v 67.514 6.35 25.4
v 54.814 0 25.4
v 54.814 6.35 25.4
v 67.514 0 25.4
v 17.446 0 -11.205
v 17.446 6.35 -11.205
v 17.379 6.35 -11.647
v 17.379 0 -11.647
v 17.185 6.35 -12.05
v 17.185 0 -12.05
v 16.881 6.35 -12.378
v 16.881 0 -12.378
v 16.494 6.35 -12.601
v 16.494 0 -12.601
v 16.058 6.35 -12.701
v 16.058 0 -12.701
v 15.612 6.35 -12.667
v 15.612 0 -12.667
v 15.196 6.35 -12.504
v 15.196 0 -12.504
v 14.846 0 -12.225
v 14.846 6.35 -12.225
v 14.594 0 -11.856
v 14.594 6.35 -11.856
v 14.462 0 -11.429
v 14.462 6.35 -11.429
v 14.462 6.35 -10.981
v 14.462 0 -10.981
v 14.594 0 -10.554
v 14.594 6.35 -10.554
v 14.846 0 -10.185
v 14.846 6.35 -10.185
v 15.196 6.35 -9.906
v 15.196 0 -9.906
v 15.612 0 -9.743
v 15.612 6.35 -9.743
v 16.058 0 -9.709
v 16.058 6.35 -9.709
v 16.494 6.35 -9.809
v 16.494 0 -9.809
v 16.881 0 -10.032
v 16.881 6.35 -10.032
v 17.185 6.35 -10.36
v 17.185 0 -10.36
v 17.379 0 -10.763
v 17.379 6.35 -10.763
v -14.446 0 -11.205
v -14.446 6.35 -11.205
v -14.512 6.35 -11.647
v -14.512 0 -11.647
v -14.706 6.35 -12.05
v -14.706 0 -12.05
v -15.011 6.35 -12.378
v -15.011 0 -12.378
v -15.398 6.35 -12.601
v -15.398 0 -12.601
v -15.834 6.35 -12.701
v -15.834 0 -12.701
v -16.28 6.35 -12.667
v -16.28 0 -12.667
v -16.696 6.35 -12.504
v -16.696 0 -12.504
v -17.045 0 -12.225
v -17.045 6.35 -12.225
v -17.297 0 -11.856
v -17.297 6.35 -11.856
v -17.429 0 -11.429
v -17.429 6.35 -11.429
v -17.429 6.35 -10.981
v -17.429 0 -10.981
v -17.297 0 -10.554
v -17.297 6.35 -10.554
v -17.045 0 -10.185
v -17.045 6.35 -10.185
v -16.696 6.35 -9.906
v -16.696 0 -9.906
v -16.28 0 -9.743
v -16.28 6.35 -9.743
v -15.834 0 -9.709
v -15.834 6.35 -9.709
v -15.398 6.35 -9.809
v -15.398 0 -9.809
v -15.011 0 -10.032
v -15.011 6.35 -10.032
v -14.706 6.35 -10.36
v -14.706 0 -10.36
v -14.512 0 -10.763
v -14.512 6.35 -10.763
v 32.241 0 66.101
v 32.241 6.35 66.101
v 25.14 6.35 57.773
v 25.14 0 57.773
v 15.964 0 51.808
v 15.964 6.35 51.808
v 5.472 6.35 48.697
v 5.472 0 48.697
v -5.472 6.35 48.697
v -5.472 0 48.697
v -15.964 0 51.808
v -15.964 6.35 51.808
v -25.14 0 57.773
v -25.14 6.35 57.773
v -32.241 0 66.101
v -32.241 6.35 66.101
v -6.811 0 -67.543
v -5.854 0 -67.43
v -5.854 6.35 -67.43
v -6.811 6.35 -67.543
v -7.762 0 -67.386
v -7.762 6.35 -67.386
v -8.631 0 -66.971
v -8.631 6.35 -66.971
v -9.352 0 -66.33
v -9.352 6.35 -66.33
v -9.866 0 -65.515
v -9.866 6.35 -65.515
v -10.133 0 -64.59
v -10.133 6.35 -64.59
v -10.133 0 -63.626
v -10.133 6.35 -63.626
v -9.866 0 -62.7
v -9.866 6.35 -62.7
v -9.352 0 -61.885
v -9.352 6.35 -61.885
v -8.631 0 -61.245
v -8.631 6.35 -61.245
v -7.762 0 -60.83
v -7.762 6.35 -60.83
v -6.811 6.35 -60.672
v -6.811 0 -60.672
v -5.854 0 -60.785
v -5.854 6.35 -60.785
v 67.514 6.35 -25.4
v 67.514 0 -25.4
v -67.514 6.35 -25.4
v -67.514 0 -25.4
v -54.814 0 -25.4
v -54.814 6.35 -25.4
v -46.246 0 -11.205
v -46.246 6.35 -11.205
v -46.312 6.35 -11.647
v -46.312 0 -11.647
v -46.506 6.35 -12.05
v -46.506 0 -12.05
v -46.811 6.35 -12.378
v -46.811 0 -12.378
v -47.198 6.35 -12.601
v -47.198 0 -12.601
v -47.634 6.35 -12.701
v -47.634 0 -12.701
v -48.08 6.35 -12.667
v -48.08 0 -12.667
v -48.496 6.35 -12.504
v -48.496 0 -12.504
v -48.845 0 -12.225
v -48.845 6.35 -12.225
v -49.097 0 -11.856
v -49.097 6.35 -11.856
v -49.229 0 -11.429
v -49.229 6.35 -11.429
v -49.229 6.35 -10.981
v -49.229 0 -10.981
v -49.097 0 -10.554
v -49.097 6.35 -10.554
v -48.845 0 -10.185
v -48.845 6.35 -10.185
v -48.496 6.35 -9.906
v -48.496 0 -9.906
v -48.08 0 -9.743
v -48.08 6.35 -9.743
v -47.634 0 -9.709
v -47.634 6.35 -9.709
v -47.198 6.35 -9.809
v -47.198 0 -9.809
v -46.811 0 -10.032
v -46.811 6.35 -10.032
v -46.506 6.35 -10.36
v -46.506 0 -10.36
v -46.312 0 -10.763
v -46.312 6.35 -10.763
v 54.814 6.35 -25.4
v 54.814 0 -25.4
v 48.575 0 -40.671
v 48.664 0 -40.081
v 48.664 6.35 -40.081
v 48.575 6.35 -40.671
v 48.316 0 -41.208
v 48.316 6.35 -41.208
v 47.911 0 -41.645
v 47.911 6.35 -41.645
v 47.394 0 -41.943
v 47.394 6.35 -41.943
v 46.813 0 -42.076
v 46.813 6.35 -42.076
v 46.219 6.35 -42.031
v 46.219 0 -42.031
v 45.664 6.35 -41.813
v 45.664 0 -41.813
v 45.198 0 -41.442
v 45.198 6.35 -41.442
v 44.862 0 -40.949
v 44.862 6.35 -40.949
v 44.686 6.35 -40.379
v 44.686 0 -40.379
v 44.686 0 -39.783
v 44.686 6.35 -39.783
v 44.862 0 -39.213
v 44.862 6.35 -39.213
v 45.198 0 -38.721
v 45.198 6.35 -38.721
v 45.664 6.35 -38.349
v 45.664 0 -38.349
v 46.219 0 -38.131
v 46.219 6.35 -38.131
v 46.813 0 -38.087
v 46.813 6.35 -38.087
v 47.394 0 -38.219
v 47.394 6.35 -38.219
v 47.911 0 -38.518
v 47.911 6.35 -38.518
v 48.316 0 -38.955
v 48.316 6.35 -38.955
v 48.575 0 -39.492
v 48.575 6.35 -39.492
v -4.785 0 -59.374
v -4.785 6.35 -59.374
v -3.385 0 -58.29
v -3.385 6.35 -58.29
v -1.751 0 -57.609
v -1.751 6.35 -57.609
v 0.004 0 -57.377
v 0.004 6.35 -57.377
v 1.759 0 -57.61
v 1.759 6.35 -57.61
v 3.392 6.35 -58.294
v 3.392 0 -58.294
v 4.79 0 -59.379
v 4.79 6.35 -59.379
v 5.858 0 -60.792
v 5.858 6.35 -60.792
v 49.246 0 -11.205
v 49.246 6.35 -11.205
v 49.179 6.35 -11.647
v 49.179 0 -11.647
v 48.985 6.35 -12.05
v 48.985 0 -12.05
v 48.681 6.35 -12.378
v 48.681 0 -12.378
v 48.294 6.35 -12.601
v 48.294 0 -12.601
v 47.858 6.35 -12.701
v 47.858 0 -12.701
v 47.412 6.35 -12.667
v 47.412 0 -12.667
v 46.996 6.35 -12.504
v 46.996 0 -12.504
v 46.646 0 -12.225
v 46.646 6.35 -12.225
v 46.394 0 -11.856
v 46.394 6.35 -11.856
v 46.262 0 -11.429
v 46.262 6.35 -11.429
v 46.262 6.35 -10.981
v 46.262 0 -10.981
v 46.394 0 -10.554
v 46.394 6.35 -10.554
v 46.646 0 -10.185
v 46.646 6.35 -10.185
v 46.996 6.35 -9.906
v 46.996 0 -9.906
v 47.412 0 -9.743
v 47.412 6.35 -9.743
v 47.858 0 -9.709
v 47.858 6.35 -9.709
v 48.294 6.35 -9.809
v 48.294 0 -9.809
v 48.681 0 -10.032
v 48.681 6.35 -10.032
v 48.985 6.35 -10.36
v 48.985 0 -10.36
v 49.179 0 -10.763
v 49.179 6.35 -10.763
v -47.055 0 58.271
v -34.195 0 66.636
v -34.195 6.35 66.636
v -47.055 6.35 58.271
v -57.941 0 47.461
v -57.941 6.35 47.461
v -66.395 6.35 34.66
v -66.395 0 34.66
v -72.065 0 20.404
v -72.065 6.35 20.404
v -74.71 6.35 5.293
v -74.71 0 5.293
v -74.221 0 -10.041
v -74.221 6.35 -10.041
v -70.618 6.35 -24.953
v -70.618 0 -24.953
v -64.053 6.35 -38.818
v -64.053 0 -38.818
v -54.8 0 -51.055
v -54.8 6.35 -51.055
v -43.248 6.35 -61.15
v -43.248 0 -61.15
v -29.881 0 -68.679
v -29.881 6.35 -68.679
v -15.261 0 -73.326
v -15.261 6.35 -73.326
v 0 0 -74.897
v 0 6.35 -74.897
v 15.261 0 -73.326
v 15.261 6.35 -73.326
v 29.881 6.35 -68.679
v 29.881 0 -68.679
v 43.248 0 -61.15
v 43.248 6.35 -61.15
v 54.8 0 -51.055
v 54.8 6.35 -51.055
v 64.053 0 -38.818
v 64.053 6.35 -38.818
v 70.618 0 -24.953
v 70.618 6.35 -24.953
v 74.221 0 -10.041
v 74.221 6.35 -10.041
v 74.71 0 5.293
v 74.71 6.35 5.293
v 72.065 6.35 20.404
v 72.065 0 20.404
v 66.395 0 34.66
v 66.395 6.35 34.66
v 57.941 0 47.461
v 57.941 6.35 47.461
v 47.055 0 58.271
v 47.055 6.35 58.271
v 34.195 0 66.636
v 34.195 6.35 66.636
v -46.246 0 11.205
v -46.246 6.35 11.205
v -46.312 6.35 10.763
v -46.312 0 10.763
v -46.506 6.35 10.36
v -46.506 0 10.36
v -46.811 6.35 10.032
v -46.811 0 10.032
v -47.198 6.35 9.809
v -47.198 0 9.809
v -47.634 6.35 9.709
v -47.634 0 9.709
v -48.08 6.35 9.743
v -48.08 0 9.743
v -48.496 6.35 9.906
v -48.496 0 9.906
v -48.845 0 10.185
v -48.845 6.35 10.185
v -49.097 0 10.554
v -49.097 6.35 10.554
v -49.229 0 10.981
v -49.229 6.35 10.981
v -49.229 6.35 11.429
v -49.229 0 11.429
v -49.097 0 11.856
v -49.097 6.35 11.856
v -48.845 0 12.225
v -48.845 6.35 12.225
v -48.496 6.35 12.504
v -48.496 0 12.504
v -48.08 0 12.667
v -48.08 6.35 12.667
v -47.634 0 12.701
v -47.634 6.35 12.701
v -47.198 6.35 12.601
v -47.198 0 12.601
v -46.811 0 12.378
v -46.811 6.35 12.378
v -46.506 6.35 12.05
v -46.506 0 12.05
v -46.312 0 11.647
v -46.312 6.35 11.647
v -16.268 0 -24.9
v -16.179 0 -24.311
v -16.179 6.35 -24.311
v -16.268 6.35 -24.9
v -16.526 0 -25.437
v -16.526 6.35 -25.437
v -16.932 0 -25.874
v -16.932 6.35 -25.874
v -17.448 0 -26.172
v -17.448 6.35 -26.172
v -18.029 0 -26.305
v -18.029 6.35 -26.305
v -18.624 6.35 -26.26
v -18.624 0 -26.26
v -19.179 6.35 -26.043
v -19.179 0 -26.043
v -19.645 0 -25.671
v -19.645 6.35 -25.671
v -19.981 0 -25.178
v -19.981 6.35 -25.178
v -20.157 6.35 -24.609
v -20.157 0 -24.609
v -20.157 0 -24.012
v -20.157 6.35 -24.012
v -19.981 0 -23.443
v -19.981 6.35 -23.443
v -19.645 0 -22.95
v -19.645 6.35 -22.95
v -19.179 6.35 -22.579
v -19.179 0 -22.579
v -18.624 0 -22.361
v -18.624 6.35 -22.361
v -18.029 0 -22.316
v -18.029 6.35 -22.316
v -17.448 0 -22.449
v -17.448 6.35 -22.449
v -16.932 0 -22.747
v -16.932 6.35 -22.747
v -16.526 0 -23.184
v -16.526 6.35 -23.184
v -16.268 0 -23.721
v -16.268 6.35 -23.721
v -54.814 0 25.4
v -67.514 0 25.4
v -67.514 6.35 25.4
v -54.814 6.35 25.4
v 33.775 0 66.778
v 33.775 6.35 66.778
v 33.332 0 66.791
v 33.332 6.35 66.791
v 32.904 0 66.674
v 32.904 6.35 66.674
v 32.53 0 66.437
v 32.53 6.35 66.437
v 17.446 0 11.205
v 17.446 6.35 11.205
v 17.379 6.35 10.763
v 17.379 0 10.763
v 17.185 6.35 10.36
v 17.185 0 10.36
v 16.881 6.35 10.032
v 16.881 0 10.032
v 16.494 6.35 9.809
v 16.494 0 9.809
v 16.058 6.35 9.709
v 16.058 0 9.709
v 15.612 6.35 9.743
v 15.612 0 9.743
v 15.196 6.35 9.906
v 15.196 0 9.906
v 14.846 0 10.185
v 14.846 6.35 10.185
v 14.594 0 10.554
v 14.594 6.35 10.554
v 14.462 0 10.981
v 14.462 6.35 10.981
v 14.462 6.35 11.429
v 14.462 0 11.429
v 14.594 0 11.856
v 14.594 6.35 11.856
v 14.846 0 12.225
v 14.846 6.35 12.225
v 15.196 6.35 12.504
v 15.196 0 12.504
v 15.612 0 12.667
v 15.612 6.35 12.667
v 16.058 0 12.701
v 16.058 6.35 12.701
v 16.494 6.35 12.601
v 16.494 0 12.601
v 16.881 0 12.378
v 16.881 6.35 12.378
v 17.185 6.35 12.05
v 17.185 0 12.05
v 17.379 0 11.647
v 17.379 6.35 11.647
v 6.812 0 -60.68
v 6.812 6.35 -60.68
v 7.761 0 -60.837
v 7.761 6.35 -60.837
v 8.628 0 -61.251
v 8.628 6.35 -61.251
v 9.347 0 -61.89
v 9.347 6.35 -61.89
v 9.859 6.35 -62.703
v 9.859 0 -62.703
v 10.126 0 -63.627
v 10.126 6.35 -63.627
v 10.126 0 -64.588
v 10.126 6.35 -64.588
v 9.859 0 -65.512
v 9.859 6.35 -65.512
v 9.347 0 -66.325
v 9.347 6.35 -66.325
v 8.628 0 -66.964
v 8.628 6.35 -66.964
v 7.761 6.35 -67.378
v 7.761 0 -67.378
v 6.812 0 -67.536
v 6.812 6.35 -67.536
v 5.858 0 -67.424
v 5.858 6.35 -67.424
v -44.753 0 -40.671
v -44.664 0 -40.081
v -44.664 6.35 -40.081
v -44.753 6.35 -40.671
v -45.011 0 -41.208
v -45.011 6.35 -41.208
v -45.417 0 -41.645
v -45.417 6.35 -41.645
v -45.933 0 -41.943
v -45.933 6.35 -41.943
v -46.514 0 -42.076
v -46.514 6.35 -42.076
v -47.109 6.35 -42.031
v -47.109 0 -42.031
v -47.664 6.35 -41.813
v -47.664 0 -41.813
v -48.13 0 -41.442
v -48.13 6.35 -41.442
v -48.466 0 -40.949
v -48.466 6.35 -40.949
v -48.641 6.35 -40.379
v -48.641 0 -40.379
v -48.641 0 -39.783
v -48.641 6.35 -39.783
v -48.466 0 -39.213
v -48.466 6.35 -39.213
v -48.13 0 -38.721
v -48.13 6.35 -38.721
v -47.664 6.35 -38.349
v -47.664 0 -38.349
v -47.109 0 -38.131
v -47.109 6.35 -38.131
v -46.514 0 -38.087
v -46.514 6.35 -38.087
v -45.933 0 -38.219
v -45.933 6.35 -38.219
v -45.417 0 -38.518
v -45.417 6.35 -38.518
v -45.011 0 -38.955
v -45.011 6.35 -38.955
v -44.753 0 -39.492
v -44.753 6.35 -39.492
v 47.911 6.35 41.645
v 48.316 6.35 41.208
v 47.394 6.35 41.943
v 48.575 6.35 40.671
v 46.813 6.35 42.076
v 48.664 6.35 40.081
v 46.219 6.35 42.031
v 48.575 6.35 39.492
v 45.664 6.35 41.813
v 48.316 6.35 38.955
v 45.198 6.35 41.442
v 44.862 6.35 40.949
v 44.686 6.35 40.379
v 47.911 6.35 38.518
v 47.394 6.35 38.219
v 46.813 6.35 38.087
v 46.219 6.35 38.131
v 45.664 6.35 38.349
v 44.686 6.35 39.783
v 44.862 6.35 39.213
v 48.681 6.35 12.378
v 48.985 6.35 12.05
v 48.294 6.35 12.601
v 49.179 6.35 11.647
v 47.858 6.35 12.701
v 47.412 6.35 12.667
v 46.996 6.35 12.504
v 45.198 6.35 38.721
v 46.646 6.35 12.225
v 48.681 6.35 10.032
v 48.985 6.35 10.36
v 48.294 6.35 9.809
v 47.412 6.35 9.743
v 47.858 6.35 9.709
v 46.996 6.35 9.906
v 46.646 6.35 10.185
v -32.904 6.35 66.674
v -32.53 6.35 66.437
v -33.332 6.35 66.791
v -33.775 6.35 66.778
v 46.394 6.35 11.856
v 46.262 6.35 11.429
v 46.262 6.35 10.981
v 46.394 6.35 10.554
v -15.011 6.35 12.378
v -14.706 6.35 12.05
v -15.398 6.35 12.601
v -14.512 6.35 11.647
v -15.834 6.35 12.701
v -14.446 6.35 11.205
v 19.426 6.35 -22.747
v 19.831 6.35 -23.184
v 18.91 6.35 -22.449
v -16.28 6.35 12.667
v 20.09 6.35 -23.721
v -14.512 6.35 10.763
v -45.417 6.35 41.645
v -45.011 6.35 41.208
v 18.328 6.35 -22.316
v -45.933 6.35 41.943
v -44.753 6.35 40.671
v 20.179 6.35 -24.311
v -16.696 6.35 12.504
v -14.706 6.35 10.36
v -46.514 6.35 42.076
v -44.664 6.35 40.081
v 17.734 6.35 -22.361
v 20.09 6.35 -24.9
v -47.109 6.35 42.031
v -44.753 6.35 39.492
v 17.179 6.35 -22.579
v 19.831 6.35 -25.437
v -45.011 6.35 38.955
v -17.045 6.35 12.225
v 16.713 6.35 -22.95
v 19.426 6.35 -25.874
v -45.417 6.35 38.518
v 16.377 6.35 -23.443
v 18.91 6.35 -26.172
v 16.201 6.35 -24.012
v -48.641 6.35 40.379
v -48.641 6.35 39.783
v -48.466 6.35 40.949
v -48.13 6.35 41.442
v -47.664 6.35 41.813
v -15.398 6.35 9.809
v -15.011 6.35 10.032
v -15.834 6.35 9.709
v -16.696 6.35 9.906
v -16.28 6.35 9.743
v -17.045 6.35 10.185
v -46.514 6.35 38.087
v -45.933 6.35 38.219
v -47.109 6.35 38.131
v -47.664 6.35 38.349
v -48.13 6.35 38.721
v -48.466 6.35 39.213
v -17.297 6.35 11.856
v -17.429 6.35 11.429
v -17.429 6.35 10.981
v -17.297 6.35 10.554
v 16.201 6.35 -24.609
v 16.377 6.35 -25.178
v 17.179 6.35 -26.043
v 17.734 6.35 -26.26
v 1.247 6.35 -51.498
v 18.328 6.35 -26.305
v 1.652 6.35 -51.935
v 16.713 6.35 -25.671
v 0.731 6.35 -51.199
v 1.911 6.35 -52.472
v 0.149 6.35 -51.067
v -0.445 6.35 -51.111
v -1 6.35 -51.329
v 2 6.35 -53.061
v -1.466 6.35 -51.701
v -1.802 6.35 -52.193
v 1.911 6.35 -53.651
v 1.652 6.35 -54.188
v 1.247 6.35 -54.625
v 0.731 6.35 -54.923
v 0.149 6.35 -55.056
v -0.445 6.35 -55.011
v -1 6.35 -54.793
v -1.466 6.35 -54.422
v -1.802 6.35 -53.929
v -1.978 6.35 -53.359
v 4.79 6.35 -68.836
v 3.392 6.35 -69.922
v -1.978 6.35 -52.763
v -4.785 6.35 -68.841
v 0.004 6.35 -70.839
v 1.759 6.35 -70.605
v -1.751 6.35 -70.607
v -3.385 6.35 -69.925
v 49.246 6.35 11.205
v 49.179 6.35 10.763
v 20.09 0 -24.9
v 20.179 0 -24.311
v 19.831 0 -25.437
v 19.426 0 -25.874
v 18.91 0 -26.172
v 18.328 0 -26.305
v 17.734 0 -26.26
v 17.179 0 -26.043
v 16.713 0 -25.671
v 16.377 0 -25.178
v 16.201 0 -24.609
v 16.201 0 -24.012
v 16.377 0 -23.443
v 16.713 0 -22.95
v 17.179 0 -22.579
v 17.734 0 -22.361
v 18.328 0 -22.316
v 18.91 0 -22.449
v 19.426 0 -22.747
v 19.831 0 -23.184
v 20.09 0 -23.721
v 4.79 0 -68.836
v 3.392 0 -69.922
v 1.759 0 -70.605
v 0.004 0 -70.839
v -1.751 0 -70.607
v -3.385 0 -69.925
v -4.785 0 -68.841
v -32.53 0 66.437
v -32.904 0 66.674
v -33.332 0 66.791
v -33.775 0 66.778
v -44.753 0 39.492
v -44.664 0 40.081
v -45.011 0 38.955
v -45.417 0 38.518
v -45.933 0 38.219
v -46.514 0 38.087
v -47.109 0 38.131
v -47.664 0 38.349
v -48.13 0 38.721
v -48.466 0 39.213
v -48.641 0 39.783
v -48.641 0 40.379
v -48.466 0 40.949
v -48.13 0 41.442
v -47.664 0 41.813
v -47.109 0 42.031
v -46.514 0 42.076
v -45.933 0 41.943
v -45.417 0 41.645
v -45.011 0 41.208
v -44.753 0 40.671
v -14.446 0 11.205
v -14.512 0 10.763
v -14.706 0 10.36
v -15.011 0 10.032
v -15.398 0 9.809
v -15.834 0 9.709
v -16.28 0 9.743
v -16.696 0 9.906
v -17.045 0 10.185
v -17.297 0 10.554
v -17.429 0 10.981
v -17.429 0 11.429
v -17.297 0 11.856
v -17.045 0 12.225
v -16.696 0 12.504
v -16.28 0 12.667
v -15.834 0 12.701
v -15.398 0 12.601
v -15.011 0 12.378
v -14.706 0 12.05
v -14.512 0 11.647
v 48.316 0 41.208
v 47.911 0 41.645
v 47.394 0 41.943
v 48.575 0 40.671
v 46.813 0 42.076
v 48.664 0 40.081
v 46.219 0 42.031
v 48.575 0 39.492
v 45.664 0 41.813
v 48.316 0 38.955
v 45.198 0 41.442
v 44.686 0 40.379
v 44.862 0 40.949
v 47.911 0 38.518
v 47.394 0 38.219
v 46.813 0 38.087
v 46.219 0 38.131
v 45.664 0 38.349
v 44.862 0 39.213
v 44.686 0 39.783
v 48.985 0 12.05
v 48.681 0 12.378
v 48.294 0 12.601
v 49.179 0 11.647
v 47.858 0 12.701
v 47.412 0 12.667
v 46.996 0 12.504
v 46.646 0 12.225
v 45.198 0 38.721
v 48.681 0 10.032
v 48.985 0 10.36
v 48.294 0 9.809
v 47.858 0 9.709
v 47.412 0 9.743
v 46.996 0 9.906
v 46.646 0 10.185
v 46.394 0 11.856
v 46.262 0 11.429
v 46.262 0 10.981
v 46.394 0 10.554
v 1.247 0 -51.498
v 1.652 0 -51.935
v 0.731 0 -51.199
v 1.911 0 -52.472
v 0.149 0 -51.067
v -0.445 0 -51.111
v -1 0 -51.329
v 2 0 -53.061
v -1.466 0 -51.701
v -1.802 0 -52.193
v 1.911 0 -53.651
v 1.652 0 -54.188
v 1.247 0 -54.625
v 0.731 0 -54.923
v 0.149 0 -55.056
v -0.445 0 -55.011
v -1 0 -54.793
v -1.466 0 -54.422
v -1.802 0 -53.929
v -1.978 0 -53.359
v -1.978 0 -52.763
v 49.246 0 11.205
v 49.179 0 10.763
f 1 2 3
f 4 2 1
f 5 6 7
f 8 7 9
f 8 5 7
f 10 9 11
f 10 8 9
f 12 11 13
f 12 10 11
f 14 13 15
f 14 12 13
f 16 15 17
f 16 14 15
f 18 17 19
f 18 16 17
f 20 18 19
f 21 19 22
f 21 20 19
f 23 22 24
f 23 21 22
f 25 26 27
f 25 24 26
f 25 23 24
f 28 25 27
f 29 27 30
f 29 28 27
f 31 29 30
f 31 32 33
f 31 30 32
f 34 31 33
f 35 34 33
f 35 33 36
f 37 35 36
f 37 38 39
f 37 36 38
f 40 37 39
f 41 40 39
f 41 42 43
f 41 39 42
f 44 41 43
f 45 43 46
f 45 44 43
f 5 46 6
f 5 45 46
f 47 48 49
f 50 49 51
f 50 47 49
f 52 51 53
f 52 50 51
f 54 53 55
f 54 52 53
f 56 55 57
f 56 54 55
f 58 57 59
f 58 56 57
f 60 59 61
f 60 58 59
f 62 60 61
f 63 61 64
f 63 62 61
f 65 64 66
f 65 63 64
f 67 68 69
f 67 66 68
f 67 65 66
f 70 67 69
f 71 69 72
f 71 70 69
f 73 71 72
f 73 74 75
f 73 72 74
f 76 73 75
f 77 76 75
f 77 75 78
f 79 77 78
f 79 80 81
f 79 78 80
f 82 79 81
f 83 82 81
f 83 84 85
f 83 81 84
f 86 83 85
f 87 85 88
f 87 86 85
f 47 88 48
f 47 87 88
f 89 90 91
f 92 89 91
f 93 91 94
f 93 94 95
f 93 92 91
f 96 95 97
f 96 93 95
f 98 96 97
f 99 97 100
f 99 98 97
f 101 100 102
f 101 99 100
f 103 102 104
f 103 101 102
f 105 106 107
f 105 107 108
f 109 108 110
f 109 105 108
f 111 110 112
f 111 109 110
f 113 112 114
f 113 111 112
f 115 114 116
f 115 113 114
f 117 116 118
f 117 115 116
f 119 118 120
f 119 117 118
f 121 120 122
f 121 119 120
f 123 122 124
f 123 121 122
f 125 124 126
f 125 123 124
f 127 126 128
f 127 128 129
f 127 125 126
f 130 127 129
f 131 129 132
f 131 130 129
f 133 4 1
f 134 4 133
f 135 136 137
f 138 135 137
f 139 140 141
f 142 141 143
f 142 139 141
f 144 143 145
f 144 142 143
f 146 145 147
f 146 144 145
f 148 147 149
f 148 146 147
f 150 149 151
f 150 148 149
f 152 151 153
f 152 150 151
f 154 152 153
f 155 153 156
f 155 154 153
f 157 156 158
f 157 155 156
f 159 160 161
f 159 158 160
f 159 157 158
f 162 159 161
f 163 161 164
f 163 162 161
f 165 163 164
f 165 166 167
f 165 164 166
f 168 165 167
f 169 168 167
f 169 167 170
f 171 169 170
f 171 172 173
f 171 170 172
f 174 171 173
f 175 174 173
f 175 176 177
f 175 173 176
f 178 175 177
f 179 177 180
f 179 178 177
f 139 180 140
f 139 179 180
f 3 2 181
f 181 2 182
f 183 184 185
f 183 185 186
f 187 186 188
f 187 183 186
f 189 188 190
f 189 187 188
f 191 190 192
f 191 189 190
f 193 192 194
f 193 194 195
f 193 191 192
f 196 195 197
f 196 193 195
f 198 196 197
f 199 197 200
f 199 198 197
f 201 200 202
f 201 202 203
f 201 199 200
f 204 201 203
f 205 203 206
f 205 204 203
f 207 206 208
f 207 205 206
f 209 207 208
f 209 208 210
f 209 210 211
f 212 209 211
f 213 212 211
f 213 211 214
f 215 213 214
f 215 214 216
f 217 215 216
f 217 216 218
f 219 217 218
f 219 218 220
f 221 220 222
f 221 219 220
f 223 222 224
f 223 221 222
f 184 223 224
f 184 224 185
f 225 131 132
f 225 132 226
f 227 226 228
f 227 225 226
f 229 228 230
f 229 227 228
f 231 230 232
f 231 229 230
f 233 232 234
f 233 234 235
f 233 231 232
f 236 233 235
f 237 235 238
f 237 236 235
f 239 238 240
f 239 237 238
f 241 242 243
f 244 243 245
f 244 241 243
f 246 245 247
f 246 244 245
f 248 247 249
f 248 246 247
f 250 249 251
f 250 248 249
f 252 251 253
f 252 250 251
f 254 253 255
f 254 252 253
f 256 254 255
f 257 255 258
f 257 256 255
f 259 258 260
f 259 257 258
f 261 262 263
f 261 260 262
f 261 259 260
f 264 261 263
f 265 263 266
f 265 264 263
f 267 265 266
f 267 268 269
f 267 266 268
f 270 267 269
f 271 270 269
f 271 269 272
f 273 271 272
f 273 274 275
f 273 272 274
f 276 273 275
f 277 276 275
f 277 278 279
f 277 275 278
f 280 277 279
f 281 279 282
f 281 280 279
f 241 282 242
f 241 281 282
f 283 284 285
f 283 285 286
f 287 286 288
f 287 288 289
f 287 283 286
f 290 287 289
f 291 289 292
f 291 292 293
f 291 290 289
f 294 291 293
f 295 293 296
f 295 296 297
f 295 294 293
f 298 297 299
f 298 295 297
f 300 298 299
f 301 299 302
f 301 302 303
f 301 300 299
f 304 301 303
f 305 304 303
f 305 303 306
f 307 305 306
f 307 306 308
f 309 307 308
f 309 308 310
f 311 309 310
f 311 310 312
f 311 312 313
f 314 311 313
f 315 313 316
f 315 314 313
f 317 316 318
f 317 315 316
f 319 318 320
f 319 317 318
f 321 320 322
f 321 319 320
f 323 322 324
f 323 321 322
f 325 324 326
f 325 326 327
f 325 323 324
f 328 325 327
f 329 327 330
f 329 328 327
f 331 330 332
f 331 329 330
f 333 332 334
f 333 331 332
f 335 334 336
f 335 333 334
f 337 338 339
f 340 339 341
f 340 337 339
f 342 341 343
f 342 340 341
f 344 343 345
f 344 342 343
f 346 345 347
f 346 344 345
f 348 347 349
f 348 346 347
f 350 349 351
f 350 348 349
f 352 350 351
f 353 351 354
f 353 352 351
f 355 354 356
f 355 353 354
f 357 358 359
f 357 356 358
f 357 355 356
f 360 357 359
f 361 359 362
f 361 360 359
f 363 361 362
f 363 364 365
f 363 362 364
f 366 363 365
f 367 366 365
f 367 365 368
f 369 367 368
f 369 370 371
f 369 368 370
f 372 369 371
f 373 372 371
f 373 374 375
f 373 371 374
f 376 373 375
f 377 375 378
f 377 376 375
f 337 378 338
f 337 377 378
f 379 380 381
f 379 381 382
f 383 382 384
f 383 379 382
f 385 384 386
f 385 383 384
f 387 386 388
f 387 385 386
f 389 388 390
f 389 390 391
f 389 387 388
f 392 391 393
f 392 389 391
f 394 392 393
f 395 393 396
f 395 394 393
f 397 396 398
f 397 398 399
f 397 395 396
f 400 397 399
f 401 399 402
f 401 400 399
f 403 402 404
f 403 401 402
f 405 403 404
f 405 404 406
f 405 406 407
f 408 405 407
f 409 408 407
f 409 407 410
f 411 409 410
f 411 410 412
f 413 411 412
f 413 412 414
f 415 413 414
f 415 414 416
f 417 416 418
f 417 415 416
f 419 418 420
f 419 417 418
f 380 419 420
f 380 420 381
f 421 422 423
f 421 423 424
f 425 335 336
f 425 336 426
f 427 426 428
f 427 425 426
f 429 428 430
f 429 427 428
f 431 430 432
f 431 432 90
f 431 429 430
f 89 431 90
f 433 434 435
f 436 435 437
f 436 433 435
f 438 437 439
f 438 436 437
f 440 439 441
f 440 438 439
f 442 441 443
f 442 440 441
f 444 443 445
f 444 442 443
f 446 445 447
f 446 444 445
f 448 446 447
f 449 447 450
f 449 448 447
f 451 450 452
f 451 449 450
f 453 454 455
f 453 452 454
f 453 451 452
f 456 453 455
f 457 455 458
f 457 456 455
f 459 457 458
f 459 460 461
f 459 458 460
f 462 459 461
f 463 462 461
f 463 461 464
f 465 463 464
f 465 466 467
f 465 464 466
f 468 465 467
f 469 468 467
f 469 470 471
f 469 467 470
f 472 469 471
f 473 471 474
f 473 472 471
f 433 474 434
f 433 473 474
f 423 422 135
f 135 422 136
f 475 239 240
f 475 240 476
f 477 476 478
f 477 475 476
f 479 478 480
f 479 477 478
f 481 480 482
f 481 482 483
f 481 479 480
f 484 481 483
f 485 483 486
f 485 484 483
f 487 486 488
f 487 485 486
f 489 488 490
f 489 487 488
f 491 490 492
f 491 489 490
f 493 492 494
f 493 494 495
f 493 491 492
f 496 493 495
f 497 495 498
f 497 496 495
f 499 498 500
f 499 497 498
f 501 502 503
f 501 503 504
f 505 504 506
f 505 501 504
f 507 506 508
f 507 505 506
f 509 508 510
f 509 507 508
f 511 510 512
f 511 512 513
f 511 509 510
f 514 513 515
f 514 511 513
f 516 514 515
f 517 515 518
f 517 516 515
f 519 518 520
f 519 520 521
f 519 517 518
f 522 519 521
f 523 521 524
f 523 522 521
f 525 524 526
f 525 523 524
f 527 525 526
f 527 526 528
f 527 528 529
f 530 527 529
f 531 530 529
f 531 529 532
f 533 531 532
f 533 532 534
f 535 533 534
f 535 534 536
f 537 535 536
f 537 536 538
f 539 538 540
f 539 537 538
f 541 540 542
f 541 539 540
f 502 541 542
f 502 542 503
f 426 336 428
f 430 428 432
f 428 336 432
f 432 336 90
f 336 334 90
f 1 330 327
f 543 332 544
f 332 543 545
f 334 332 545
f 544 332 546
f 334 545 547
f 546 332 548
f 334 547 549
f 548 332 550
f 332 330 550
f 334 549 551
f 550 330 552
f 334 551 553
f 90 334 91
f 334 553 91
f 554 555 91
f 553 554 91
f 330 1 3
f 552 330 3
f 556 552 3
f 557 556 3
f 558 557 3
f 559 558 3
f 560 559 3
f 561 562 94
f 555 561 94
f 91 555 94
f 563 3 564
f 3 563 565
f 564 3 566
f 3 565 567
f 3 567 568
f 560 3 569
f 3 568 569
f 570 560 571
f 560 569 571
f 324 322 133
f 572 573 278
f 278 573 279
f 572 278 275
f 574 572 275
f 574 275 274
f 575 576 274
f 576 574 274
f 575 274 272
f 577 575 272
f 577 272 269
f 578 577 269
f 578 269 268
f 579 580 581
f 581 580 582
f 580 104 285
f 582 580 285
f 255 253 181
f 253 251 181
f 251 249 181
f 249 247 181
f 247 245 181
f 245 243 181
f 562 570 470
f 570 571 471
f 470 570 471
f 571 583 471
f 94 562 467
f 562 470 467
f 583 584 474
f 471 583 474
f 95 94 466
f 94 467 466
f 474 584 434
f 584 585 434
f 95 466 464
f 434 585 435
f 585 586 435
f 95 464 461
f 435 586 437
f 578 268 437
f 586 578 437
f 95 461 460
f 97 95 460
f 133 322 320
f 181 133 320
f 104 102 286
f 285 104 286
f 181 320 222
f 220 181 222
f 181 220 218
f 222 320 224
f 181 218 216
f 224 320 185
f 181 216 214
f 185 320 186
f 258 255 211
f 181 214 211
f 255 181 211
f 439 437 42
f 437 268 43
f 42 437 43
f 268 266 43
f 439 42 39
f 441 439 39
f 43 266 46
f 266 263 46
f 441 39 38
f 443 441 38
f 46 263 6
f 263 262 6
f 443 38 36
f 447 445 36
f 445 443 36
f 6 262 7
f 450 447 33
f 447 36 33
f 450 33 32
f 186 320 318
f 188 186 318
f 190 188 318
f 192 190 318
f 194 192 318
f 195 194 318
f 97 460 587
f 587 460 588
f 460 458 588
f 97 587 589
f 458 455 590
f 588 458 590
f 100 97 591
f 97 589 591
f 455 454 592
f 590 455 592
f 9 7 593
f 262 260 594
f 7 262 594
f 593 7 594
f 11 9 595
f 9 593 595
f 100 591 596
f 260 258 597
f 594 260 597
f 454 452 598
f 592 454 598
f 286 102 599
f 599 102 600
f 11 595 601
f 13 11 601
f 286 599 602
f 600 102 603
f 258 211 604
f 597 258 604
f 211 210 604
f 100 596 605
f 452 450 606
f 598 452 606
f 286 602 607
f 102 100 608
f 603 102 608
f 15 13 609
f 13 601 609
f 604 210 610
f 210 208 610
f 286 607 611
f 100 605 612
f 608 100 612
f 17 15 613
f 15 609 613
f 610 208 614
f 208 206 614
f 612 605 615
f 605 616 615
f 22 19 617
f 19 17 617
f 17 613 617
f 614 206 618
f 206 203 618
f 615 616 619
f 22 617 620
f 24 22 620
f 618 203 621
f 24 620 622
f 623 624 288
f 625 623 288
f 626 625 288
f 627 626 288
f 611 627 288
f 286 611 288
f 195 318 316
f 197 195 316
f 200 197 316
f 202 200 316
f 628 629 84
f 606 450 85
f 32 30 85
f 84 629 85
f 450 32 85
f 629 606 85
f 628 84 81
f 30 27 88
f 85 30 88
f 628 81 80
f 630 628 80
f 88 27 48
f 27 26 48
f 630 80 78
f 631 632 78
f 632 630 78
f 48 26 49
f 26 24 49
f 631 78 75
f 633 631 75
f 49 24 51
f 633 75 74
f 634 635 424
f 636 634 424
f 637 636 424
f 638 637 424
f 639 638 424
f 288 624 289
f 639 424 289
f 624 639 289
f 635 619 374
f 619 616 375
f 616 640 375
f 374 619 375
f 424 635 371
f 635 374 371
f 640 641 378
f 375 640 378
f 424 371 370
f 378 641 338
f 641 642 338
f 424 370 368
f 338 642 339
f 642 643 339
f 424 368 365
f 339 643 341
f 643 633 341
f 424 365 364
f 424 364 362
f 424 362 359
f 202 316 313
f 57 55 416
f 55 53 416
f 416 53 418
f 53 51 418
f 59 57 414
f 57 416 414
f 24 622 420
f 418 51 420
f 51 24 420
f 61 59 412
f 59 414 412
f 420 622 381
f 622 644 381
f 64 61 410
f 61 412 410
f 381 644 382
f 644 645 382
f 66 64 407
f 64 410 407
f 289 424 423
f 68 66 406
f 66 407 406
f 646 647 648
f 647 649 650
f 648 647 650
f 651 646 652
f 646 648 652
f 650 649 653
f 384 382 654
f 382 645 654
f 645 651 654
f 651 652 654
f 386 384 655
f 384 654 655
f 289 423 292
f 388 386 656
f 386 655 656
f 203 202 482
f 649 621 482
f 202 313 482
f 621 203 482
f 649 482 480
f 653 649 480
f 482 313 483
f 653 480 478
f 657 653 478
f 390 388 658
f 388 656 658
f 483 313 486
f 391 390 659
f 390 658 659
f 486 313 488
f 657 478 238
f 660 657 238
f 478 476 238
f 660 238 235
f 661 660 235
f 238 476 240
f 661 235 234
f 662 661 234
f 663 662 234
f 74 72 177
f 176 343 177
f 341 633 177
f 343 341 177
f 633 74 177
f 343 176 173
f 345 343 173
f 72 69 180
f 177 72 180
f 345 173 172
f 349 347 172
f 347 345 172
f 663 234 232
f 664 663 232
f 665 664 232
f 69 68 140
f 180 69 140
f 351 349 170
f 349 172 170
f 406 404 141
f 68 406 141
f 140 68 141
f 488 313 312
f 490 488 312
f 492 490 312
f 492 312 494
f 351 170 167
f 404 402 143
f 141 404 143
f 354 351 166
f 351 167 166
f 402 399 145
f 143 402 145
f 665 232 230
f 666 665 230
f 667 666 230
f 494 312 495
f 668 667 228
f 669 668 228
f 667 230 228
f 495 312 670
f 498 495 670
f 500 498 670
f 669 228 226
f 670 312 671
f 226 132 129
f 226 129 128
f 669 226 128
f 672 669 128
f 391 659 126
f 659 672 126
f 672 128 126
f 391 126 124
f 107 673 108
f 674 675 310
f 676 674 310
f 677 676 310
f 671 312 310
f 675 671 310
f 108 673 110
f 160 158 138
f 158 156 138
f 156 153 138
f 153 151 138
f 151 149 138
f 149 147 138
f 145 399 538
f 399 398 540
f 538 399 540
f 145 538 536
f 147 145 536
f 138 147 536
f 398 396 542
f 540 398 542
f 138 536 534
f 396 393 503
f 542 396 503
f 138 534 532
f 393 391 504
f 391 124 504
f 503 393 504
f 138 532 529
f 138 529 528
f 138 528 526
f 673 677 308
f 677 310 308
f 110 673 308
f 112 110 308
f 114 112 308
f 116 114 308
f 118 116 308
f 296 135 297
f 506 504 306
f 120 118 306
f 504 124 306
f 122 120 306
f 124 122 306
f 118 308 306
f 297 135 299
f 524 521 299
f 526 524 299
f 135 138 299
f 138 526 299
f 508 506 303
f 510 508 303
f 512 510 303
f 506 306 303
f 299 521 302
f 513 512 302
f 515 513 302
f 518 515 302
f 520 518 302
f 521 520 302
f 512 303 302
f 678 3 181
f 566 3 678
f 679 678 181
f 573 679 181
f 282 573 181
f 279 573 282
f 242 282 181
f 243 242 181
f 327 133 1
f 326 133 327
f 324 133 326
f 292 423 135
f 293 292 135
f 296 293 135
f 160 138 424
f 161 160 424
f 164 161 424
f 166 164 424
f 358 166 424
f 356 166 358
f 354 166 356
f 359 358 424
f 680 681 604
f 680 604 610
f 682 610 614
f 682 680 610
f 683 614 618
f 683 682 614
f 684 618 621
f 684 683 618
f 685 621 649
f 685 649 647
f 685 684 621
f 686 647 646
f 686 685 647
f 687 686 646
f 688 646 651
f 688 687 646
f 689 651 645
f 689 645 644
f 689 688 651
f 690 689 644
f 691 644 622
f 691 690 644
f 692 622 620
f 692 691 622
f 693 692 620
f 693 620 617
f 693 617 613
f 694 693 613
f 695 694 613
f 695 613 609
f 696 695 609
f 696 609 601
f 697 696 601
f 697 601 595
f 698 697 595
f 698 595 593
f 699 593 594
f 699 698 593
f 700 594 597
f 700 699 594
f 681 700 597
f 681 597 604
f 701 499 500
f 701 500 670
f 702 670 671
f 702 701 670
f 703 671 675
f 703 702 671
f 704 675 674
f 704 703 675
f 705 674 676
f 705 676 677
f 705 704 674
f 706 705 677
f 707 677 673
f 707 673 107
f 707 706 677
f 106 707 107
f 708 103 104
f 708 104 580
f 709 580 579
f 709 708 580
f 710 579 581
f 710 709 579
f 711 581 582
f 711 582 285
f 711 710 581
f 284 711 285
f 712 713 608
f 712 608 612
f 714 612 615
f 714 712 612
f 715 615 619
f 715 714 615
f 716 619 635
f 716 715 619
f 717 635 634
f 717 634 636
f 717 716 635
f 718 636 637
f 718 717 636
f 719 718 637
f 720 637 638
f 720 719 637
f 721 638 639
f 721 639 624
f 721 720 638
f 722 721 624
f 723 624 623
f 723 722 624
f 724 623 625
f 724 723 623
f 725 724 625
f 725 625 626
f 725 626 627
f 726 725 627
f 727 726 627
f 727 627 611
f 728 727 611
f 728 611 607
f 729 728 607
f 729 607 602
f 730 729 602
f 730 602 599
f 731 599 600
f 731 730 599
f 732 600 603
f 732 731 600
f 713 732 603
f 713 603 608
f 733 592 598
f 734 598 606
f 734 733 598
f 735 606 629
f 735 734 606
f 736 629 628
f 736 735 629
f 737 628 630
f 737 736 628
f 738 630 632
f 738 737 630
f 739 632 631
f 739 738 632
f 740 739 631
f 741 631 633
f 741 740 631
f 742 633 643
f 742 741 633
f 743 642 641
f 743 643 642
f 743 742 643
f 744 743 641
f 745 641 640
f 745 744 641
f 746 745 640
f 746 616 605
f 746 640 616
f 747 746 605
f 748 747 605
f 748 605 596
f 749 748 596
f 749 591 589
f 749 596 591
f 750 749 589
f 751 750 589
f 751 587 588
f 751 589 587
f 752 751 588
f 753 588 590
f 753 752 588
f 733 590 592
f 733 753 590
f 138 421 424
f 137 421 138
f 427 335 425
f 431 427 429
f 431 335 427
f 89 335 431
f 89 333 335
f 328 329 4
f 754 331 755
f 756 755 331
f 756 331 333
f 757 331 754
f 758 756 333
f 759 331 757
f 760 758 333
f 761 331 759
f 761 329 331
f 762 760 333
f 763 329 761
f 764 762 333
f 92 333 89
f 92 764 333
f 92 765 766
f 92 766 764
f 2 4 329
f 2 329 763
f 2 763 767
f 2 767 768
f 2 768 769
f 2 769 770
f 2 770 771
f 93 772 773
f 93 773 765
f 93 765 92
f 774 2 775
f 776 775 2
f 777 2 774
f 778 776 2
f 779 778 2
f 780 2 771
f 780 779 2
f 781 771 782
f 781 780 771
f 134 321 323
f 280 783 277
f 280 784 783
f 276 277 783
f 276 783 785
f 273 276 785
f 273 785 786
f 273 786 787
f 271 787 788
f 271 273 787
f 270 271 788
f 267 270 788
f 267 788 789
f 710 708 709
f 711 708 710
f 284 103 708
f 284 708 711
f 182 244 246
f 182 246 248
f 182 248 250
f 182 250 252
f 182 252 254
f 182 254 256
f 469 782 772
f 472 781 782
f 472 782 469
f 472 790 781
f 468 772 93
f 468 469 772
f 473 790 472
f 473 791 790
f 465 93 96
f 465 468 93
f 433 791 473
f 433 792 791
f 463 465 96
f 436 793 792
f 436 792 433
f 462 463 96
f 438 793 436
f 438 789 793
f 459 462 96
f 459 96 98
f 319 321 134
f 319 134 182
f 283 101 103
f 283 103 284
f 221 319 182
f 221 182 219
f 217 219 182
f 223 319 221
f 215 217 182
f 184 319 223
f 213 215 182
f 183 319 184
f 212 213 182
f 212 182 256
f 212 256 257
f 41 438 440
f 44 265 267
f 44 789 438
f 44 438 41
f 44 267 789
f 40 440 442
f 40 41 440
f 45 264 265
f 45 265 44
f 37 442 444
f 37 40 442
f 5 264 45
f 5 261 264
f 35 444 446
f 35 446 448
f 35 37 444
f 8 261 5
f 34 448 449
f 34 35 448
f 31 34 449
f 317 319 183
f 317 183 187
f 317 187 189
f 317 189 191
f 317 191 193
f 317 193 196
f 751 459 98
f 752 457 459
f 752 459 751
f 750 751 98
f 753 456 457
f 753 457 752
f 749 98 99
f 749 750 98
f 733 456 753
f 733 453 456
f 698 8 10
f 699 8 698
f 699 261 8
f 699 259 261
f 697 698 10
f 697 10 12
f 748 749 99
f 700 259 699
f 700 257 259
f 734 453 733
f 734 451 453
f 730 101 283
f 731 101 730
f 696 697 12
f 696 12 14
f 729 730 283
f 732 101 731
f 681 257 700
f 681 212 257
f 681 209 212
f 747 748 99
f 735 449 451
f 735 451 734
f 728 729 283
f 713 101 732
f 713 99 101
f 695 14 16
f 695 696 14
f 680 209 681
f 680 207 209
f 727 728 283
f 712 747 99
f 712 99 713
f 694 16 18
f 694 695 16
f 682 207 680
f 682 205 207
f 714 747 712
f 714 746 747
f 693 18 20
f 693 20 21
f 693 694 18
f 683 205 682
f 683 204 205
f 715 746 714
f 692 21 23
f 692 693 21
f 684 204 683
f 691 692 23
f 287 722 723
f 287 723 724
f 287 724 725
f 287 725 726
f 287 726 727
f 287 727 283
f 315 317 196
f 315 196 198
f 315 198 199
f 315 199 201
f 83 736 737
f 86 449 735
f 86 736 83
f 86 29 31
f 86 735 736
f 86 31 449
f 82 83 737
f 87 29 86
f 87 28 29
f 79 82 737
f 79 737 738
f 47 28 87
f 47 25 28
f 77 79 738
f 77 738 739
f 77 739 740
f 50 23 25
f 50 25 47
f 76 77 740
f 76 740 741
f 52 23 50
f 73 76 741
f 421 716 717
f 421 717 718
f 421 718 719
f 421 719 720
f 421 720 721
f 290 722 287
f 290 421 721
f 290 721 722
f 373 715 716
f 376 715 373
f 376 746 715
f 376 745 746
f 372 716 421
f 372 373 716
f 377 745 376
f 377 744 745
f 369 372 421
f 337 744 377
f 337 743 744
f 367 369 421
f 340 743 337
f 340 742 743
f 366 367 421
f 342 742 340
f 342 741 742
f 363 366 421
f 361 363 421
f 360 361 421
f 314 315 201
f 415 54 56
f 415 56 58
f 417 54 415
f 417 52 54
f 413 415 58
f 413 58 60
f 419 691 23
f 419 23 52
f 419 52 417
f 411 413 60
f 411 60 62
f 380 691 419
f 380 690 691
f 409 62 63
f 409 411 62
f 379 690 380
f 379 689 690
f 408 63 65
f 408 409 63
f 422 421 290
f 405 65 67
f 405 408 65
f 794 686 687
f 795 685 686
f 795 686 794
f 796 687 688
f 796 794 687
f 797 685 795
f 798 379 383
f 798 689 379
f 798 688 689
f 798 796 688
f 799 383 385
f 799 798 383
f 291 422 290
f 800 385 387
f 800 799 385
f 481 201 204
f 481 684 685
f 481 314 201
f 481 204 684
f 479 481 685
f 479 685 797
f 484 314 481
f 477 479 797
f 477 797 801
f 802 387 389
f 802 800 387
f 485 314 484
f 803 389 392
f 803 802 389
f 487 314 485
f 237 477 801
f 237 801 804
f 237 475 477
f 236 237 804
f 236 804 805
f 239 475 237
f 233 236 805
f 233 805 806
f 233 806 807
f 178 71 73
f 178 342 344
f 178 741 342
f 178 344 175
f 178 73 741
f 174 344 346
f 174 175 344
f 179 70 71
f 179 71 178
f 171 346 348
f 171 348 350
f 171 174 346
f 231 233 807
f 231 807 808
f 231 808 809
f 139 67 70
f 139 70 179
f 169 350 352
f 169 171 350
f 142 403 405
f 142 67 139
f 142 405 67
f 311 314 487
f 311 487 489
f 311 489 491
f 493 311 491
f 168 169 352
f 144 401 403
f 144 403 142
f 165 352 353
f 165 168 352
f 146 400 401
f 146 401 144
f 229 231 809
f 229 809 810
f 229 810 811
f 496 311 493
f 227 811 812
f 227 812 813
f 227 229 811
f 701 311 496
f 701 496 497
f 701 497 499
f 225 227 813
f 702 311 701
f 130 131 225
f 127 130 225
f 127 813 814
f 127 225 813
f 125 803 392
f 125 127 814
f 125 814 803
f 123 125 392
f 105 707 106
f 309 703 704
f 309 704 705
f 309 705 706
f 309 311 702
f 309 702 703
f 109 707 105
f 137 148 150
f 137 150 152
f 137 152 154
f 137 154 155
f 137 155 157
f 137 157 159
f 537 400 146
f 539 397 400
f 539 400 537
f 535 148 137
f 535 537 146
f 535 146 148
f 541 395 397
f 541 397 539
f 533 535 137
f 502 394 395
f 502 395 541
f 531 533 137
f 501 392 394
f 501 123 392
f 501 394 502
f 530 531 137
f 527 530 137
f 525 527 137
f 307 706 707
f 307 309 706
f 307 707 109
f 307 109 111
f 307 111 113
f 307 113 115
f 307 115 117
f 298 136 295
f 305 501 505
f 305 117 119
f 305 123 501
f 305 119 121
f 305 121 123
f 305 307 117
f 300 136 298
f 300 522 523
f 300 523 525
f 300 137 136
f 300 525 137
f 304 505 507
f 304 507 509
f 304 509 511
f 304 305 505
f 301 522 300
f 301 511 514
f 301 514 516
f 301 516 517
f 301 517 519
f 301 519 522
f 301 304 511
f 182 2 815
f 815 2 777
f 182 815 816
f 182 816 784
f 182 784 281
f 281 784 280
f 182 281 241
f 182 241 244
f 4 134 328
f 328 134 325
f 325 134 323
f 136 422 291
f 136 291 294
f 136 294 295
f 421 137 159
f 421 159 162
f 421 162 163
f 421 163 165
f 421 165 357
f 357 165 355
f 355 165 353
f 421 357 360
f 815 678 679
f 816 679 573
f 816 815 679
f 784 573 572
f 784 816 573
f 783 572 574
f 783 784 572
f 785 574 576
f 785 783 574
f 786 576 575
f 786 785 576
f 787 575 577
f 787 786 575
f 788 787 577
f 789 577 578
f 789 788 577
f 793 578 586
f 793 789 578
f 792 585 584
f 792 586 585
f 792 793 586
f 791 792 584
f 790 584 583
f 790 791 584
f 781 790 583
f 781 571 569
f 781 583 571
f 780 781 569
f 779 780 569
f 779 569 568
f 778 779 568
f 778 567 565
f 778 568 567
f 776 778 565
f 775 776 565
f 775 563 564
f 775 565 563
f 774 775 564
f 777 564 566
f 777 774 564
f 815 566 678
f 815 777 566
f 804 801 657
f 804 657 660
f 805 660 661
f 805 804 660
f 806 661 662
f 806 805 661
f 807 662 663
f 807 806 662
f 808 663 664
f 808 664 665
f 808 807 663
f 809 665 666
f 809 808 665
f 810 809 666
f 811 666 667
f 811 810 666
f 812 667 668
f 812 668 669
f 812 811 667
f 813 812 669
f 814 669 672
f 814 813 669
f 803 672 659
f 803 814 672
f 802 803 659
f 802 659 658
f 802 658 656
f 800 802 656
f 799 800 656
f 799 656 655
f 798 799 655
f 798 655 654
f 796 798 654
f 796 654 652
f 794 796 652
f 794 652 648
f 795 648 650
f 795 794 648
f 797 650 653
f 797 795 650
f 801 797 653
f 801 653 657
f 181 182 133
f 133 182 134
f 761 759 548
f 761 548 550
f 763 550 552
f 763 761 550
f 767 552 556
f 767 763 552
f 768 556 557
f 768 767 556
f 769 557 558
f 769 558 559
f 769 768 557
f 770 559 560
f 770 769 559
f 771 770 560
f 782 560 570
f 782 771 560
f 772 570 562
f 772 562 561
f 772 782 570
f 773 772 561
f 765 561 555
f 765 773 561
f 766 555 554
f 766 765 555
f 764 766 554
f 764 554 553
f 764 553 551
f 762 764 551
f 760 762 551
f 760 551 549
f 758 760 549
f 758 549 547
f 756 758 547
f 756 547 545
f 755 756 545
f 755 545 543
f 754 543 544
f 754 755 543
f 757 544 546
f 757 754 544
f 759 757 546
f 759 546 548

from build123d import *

# Parameters (mm, degrees)
SKETCH1_R           = 2
SKETCH1_W           = 12.7
SKETCH1_H           = 50.8
BOSS_EXTRUDE3_DEPTH = 6.35
SKETCH2_R           = 1.5
CUT_EXTRUDE2_DEPTH  = 10


with BuildPart() as part:
    # Sketch1 → Boss-Extrude3 (new body)
    with BuildSketch(Plane(origin=(0, 0, 0), x_dir=(1, 0, 0), z_dir=(0, 1, 0))):
        with BuildLine():
            ThreePointArc((34.194833578, -66.63583839), (33.11372382, -66.748004461), (32.240681933, -66.10056535))
            ThreePointArc((32.240681933, -66.10056535), (0, -48.302004425), (-32.240681933, -66.10056535))
            ThreePointArc((-32.240681933, -66.10056535), (-33.11372382, -66.748004461), (-34.194833578, -66.63583839))
            ThreePointArc((-34.194833578, -66.63583839), (0, 74.897407173), (34.194833578, -66.63583839))
        make_face()
        with Locations((0, 53.061187965)):
            Circle(SKETCH1_R, mode=Mode.SUBTRACT)
        with Locations((18.178952795, 24.310551096)):
            Circle(SKETCH1_R, mode=Mode.SUBTRACT)
        with Locations((46.663733983, 40.081231883)):
            Circle(SKETCH1_R, mode=Mode.SUBTRACT)
        with Locations((46.663733983, -40.081231883)):
            Circle(SKETCH1_R, mode=Mode.SUBTRACT)
        with Locations((-46.663733983, -40.081231883)):
            Circle(SKETCH1_R, mode=Mode.SUBTRACT)
        with Locations((-18.178952795, 24.310551096)):
            Circle(SKETCH1_R, mode=Mode.SUBTRACT)
        with Locations((-46.663733983, 40.081231883)):
            Circle(SKETCH1_R, mode=Mode.SUBTRACT)
        with Locations((61.164123727, 0)):
            Rectangle(SKETCH1_W, SKETCH1_H, mode=Mode.SUBTRACT)
        with Locations((-61.164123727, 0)):
            Rectangle(SKETCH1_W, SKETCH1_H, mode=Mode.SUBTRACT)
        with BuildLine():
            ThreePointArc((-5.853899988, 60.78531778), (0.003726822, 57.376699875), (5.857575472, 60.791802193))
            ThreePointArc((5.857575472, 60.791802193), (10.16, 64.107698843), (5.857575472, 67.423595493))
            ThreePointArc((5.857575472, 67.423595493), (0.003726822, 70.838697812), (-5.853899988, 67.430079907))
            ThreePointArc((-5.853899988, 67.430079907), (-10.167207264, 64.107698843), (-5.853899988, 60.78531778))
        make_face(mode=Mode.SUBTRACT)
    extrude(amount=BOSS_EXTRUDE3_DEPTH)

    # Sketch2 → Cut-Extrude2 (cut)
    with BuildSketch(Plane(origin=(0, 0, 0), x_dir=(1, 0, 0), z_dir=(0, 1, 0))):
        with Locations((-47.745737366, 11.205)):
            Circle(SKETCH2_R)
        with Locations((-47.745737366, -11.205)):
            Circle(SKETCH2_R)
        with Locations((-15.945737366, 11.205)):
            Circle(SKETCH2_R)
        with Locations((-15.945737366, -11.205)):
            Circle(SKETCH2_R)
        with Locations((15.945737366, -11.205)):
            Circle(SKETCH2_R)
        with Locations((15.945737366, 11.205)):
            Circle(SKETCH2_R)
        with Locations((47.745737366, -11.205)):
            Circle(SKETCH2_R)
        with Locations((47.745737366, 11.205)):
            Circle(SKETCH2_R)
    extrude(amount=CUT_EXTRUDE2_DEPTH, mode=Mode.SUBTRACT)


solid = part.part
